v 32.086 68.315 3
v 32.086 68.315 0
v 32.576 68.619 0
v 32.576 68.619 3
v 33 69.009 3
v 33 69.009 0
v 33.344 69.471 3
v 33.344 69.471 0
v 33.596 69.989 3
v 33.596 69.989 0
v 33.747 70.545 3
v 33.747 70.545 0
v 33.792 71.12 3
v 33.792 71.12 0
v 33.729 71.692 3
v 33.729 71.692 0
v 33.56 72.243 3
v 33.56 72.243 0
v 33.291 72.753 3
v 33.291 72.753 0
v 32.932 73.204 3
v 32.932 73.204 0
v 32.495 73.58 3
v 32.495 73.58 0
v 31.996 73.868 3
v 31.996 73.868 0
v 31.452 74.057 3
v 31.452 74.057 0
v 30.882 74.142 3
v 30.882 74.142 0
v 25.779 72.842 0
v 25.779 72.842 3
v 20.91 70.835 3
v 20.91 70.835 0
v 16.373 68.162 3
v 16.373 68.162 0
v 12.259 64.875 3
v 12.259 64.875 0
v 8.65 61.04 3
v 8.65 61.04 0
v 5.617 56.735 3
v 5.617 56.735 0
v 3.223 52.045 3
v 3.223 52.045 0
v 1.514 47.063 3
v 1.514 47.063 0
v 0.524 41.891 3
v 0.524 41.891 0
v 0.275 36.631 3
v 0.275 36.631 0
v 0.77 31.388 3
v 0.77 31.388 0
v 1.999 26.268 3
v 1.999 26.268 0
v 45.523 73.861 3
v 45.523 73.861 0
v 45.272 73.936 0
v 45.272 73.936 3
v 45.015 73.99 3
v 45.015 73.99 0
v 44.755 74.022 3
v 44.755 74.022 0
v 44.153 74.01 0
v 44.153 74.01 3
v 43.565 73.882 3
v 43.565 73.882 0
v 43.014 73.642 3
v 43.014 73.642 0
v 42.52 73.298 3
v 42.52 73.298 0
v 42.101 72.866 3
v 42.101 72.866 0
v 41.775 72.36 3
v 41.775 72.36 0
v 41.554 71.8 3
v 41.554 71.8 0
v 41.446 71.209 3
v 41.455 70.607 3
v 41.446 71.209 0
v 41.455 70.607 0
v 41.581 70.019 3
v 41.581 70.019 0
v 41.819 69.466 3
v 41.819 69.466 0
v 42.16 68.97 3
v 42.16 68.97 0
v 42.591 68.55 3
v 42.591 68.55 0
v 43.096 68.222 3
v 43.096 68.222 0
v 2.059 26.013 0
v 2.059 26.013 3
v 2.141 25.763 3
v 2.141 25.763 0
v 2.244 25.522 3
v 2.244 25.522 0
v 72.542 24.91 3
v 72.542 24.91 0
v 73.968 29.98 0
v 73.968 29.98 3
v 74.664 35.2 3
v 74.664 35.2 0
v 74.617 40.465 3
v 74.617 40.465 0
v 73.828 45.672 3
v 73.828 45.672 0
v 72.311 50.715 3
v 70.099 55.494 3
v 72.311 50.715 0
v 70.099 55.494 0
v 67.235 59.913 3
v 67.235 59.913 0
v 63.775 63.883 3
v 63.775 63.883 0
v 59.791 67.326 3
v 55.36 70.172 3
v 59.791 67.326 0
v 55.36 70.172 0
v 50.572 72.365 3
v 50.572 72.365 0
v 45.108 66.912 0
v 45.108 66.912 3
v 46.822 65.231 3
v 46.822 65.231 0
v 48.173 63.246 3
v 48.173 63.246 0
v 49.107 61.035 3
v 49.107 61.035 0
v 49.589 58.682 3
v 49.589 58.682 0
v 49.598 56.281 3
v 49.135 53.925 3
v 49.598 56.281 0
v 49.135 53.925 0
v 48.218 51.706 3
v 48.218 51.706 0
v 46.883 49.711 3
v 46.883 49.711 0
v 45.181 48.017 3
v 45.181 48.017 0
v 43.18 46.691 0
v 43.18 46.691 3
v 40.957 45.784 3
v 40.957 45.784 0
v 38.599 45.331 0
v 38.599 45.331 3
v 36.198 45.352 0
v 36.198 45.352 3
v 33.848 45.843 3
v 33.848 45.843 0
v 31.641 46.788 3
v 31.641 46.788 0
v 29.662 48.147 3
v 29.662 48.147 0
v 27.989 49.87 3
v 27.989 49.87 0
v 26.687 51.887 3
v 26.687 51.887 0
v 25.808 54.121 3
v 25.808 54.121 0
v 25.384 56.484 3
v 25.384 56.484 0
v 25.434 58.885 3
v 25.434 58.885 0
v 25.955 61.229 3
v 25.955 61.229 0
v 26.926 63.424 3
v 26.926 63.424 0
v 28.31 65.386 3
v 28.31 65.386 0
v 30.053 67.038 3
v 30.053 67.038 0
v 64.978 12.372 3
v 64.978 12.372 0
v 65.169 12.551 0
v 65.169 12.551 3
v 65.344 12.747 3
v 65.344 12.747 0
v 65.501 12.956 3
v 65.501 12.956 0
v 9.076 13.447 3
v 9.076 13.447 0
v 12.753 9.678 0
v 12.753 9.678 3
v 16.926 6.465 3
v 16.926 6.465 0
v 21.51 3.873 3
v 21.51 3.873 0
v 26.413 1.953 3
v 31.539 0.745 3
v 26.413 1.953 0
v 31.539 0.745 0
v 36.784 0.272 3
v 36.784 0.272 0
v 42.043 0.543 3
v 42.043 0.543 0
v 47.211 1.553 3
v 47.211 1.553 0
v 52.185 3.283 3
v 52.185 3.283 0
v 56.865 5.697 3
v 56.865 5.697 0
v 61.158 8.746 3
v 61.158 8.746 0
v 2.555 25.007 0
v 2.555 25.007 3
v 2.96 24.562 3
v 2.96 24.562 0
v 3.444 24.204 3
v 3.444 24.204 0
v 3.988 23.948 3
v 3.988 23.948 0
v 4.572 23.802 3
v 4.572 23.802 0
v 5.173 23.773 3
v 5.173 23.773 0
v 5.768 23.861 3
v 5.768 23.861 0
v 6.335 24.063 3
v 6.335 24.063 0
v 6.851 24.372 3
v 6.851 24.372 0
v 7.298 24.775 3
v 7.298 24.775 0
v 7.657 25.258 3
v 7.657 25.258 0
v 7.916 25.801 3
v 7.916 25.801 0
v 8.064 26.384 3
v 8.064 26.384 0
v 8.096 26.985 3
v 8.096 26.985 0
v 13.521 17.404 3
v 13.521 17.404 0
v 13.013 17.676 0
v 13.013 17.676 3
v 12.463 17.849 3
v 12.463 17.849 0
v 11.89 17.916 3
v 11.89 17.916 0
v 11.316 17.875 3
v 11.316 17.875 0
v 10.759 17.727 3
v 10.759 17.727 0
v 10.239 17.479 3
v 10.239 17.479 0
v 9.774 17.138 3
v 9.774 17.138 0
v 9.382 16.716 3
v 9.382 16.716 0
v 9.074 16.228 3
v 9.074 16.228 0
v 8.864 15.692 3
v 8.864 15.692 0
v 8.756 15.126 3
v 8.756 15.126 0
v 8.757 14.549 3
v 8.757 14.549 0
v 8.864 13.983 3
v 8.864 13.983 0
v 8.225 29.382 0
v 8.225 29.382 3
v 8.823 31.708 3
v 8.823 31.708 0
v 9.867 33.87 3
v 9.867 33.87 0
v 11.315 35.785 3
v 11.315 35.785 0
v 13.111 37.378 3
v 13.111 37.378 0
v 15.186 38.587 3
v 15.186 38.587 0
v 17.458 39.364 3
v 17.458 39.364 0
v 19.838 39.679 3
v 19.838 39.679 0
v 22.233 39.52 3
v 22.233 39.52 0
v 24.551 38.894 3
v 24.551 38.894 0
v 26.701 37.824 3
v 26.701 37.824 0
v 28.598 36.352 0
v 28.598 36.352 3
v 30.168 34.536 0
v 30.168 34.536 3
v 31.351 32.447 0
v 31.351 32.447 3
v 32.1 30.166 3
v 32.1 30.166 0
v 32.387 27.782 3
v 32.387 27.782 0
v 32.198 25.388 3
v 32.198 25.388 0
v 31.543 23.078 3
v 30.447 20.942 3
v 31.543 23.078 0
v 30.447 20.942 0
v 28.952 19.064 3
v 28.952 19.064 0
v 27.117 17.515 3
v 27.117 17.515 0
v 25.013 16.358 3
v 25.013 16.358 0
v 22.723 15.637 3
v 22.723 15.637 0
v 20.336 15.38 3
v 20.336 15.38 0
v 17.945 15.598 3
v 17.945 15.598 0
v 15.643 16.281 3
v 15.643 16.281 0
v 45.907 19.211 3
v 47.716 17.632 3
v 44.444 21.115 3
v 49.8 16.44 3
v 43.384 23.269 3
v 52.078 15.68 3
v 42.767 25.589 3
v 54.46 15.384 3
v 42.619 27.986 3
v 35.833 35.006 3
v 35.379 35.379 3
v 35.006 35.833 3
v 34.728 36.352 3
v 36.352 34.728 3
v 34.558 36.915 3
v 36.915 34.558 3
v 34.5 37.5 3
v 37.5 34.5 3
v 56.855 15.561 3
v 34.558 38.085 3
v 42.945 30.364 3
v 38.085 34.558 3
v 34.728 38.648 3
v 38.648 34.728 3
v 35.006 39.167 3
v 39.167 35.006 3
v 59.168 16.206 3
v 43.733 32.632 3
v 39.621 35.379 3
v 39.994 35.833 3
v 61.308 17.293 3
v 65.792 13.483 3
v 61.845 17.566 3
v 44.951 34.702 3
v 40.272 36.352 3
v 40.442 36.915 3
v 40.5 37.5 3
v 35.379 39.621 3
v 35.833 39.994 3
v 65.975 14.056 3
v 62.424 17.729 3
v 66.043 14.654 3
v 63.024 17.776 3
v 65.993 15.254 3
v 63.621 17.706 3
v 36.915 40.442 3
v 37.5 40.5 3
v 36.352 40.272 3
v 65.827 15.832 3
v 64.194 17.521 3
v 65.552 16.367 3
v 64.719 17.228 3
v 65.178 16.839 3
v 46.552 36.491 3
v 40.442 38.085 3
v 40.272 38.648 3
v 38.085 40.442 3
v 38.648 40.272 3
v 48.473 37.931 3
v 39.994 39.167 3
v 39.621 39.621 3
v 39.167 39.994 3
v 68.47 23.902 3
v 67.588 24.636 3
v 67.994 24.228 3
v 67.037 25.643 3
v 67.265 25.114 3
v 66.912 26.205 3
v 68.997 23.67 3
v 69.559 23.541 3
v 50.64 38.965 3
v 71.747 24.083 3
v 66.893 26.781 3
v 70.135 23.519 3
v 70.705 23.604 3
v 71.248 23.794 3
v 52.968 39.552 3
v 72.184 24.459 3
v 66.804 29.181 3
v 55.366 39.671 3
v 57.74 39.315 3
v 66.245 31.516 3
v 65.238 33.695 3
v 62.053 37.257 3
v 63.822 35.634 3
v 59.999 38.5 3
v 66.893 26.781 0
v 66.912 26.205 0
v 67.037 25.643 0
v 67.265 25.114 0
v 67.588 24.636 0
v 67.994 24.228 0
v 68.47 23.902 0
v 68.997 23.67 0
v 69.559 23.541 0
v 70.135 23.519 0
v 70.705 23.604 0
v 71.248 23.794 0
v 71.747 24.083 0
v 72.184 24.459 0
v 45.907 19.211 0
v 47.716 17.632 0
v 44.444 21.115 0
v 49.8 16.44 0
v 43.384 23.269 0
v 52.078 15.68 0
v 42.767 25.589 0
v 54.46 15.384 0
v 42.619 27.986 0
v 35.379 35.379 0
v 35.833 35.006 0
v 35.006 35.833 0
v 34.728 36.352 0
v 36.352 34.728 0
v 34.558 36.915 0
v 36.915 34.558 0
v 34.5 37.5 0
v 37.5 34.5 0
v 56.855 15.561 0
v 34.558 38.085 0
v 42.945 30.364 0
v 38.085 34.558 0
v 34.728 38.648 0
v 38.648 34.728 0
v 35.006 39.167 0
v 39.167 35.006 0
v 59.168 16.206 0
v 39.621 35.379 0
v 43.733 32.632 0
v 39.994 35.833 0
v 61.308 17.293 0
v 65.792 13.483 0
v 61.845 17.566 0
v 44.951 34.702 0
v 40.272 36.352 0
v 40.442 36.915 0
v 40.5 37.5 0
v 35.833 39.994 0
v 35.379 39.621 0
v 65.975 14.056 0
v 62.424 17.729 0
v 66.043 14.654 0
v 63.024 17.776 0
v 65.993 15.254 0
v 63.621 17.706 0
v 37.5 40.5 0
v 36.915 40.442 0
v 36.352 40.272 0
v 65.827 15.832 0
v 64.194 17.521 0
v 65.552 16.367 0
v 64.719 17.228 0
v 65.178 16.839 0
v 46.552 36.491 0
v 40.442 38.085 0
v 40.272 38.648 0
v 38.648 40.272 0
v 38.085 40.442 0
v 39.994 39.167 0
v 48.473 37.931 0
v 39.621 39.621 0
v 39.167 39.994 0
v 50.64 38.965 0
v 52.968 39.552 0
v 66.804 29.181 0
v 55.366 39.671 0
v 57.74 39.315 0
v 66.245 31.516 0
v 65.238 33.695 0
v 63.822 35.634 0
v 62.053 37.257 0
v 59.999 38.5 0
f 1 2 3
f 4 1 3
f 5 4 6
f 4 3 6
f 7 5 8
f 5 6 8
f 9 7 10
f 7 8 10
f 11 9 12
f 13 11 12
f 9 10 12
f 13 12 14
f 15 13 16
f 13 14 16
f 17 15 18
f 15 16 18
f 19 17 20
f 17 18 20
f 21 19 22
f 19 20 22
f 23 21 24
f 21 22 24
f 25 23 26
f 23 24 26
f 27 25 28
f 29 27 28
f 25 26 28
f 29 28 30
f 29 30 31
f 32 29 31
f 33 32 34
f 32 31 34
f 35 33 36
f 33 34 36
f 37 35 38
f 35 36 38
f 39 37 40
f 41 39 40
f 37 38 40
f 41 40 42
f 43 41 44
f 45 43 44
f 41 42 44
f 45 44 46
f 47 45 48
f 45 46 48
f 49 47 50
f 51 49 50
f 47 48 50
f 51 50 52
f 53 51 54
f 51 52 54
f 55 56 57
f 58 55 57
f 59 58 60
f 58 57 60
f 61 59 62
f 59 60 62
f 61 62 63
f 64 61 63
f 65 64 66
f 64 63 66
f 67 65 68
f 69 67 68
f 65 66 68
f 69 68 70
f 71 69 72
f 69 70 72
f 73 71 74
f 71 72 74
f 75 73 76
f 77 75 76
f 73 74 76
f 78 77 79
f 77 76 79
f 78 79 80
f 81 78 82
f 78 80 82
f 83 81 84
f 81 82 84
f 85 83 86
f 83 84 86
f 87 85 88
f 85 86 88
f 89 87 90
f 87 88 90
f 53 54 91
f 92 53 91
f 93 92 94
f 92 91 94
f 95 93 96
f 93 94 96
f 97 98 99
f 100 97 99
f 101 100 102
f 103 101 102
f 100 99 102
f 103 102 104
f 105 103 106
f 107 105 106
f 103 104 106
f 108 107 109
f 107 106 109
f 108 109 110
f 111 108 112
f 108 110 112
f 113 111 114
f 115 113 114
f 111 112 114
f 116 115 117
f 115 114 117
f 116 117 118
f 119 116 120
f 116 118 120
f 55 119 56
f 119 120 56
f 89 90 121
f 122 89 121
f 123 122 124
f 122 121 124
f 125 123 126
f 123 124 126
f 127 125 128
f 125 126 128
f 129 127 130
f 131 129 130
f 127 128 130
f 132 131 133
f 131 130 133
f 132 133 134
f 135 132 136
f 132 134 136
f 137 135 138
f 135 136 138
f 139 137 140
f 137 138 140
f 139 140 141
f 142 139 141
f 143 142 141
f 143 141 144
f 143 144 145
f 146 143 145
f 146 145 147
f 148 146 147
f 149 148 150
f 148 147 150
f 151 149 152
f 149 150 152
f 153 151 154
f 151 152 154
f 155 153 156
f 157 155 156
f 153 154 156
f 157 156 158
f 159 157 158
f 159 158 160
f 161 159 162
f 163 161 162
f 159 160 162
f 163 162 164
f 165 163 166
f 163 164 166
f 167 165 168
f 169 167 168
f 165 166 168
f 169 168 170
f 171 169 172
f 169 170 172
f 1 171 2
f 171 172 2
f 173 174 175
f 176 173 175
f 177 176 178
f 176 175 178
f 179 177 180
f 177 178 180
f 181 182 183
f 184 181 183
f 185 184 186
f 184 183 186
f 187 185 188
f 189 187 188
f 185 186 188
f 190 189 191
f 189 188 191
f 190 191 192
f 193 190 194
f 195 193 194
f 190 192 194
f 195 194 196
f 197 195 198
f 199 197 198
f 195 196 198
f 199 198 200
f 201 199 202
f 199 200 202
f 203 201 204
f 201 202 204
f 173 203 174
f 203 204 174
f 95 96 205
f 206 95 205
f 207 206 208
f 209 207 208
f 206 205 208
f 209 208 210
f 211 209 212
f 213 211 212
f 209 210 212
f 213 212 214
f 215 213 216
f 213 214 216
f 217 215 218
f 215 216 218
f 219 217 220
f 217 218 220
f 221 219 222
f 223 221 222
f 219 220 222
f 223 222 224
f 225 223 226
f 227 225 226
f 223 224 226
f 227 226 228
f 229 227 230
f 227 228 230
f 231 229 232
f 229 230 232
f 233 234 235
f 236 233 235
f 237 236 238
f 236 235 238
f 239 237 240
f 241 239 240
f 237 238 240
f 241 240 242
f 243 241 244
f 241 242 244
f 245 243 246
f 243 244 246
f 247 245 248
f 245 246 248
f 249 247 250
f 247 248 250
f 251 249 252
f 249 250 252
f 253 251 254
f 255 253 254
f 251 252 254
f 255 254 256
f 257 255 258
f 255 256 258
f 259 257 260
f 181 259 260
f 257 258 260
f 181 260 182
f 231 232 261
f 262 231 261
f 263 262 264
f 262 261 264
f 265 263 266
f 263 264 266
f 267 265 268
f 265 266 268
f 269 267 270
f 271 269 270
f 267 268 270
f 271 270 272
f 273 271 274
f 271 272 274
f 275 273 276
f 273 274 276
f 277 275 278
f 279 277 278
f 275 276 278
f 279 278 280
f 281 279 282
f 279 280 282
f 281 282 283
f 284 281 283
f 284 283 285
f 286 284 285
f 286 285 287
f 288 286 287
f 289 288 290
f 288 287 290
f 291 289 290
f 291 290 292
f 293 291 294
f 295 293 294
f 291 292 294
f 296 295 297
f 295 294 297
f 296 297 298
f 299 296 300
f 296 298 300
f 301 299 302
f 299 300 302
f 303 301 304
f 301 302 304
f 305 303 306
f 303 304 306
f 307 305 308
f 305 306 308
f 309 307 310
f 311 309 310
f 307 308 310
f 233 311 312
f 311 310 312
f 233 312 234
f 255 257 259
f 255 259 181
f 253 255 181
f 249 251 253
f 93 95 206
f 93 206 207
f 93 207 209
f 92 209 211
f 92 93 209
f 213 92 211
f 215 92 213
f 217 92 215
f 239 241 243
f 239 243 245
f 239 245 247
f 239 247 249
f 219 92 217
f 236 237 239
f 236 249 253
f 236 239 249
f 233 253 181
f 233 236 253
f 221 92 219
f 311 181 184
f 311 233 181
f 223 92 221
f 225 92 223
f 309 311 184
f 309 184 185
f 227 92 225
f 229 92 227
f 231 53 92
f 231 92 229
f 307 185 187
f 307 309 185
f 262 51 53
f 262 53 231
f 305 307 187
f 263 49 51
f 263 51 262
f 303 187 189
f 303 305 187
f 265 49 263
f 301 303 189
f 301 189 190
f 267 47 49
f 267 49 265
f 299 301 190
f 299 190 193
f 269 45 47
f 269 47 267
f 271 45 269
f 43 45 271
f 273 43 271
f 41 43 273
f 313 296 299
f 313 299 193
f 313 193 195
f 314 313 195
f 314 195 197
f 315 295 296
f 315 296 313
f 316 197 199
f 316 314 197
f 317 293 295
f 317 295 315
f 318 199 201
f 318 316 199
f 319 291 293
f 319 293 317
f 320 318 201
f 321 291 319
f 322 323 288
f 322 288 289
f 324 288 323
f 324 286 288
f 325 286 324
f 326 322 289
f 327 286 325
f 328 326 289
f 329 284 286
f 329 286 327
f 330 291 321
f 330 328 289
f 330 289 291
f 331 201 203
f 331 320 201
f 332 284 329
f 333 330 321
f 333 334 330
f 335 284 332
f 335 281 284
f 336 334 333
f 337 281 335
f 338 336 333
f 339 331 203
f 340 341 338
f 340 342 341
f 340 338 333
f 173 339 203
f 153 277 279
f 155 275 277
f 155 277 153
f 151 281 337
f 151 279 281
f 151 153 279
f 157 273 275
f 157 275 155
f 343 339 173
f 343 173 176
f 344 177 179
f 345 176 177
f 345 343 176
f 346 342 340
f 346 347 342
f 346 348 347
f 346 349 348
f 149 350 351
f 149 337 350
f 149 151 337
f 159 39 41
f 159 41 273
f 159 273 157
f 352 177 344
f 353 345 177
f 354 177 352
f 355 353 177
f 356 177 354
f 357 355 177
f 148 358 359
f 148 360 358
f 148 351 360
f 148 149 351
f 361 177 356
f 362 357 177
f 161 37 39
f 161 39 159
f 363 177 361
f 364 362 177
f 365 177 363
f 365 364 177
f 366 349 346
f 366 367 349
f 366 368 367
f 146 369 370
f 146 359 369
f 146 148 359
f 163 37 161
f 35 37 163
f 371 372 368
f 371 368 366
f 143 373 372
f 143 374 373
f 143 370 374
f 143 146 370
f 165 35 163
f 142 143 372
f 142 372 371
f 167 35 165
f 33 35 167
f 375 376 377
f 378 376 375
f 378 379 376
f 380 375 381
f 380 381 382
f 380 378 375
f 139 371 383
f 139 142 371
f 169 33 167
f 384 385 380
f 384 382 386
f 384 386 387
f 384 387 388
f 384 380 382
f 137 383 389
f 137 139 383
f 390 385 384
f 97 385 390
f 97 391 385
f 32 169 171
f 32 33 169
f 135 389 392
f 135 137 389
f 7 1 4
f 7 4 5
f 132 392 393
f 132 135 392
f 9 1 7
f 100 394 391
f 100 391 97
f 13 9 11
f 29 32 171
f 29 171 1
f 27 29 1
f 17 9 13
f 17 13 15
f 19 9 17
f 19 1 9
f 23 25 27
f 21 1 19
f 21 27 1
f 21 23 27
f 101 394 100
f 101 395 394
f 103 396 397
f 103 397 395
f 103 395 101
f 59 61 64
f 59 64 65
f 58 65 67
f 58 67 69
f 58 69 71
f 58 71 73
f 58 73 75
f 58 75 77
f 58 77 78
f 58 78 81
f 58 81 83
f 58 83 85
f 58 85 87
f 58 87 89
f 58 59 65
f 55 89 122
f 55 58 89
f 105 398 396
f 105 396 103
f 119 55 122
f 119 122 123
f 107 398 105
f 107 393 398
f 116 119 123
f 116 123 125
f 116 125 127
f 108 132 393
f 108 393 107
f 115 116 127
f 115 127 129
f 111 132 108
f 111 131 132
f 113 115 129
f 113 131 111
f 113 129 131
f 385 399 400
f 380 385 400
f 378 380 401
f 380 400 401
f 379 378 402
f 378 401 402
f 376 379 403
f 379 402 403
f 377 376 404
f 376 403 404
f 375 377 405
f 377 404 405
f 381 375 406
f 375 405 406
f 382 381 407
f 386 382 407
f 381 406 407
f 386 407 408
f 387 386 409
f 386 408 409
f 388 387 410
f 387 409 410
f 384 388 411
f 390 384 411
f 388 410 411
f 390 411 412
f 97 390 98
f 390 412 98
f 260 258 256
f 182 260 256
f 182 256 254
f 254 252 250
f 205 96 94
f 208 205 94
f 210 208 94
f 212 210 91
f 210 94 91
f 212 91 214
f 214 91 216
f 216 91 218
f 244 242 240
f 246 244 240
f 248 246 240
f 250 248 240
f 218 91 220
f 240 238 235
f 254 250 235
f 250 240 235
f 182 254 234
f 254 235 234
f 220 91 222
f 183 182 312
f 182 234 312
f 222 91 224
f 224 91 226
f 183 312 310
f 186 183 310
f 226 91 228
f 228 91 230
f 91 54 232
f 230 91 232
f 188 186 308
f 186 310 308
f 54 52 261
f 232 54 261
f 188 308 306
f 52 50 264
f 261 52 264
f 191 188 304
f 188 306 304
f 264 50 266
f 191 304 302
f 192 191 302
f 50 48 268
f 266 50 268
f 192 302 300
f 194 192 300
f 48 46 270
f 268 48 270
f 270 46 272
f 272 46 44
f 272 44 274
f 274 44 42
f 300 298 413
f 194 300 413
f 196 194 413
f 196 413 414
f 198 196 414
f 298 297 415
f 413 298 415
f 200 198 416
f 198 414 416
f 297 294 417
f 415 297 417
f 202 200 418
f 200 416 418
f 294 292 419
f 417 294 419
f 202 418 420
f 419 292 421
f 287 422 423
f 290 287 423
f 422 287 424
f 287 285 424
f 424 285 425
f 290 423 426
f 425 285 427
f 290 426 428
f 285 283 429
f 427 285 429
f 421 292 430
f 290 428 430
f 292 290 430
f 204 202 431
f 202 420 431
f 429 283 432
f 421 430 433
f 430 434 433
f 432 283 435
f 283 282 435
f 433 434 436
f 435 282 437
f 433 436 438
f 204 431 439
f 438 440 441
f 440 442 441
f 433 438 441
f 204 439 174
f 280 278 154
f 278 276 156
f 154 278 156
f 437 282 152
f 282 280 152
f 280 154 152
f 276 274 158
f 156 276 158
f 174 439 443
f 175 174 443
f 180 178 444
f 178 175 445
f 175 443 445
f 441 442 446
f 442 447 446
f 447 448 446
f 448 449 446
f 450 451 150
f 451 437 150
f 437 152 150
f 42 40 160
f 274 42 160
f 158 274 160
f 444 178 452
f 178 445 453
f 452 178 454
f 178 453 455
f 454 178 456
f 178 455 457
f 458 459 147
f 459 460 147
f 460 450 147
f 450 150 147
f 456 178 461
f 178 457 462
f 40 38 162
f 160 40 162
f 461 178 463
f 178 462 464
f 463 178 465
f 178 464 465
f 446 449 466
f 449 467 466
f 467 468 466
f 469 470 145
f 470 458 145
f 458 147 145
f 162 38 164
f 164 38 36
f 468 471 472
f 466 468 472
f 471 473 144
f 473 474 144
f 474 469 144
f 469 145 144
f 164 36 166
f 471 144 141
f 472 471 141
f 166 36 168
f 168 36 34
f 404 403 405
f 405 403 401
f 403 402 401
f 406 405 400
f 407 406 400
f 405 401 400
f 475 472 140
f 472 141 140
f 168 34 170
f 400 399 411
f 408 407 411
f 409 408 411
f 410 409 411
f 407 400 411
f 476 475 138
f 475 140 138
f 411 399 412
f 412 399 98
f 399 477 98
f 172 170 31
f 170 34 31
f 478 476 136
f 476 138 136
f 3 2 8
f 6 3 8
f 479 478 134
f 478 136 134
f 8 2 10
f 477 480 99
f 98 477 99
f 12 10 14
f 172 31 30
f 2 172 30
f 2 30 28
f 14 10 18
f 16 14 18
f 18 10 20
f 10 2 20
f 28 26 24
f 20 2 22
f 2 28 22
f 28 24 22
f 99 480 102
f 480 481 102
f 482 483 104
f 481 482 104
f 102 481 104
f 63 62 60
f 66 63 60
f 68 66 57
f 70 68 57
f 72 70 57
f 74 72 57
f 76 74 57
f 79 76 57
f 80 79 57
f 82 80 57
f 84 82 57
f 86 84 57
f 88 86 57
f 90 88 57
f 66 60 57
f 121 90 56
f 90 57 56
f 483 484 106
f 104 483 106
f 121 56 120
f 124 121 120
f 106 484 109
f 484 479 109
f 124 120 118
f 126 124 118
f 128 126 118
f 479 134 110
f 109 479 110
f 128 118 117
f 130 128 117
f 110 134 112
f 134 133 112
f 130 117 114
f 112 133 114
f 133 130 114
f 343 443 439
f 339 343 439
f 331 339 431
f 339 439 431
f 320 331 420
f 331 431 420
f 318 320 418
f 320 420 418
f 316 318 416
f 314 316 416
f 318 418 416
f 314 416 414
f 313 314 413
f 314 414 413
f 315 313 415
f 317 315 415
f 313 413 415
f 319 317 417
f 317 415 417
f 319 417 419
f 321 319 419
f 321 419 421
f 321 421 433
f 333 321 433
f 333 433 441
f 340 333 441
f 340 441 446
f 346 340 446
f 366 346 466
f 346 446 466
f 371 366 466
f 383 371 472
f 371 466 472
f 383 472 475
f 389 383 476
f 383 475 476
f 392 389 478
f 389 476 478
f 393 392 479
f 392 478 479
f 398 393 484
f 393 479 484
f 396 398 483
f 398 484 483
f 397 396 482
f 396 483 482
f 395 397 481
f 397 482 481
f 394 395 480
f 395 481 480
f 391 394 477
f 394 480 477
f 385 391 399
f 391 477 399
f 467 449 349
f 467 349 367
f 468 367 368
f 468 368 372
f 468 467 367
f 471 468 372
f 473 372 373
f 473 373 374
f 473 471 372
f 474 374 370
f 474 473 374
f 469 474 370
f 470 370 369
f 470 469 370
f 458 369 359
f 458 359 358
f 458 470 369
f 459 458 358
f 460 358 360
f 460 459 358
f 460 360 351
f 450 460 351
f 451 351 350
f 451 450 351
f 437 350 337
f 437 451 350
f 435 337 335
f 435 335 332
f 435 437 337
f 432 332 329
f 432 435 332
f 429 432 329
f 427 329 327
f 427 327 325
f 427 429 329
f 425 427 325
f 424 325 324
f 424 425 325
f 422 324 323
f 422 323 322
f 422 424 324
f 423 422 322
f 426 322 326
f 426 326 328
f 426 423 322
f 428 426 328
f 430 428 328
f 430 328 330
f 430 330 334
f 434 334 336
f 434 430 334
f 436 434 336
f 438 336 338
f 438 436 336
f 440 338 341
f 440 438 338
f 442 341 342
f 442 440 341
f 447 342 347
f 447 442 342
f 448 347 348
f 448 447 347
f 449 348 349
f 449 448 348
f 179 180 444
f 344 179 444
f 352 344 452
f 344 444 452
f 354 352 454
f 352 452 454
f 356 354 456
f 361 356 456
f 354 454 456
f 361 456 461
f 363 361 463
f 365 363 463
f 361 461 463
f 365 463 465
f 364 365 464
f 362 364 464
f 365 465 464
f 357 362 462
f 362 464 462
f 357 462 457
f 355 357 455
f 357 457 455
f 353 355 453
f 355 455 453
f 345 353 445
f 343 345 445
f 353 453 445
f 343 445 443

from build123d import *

# Parameters (mm, degrees)
F0_R     = 3
F1_DEPTH = 3


with BuildPart() as f1:
    # F0 (on Top) → F1 (new body)
    with BuildSketch(Plane.XY):
        with BuildLine():
            ThreePointArc((2.243782, 25.522082), (2.11952, 25.894266), (1.999187, 26.267739))
            ThreePointArc((1.999187, 26.267739), (2.097618, 25.887082), (2.243782, 25.522082))
        make_face()
        with BuildLine():
            ThreePointArc((45.522983, 73.860736), (45.144109, 73.965821), (44.754928, 74.021739))
            ThreePointArc((44.754928, 74.021739), (45.13938, 73.943261), (45.522983, 73.860736))
        make_face()
        with BuildLine():
            ThreePointArc((65.50129, 12.956179), (65.2411, 12.662473), (64.97783, 12.371525))
            ThreePointArc((64.97783, 12.371525), (65.258273, 12.647097), (65.50129, 12.956179))
        make_face()
        with BuildLine():
            ThreePointArc((32.085906, 68.314754), (33.728593, 71.692394), (30.881851, 74.142482))
            ThreePointArc((30.881851, 74.142482), (5.617411, 56.734654), (1.999187, 26.267739))
            ThreePointArc((1.999187, 26.267739), (2.11952, 25.894266), (2.243782, 25.522082))
            ThreePointArc((2.243782, 25.522082), (5.767854, 23.860831), (8.095696, 26.984929))
            ThreePointArc((8.095696, 26.984929), (30.811472, 33.520681), (13.520687, 17.40388))
            ThreePointArc((13.520687, 17.40388), (9.774222, 17.137669), (9.075754, 13.447274))
            ThreePointArc((9.075754, 13.447274), (36.783596, 0.271541), (64.97783, 12.371525))
            ThreePointArc((64.97783, 12.371525), (65.2411, 12.662473), (65.50129, 12.956179))
            ThreePointArc((65.50129, 12.956179), (65.17794, 16.83874), (61.30847, 17.292661))
            ThreePointArc((61.30847, 17.292661), (44.290455, 33.697224), (66.893407, 26.781366))
            ThreePointArc((66.893407, 26.781366), (68.997185, 23.669938), (72.542395, 24.910244))
            ThreePointArc((72.542395, 24.910244), (70.098993, 55.493805), (45.522983, 73.860736))
            ThreePointArc((45.522983, 73.860736), (45.13938, 73.943261), (44.754928, 74.021739))
            ThreePointArc((44.754928, 74.021739), (41.554206, 71.800429), (43.095833, 68.22241))
            ThreePointArc((43.095833, 68.22241), (37.398073, 45.282094), (32.085906, 68.314754))
        make_face()
        with Locations((37.5, 37.5)):
            Circle(F0_R, mode=Mode.SUBTRACT)
    extrude(amount=F1_DEPTH)


solid = f1.part
